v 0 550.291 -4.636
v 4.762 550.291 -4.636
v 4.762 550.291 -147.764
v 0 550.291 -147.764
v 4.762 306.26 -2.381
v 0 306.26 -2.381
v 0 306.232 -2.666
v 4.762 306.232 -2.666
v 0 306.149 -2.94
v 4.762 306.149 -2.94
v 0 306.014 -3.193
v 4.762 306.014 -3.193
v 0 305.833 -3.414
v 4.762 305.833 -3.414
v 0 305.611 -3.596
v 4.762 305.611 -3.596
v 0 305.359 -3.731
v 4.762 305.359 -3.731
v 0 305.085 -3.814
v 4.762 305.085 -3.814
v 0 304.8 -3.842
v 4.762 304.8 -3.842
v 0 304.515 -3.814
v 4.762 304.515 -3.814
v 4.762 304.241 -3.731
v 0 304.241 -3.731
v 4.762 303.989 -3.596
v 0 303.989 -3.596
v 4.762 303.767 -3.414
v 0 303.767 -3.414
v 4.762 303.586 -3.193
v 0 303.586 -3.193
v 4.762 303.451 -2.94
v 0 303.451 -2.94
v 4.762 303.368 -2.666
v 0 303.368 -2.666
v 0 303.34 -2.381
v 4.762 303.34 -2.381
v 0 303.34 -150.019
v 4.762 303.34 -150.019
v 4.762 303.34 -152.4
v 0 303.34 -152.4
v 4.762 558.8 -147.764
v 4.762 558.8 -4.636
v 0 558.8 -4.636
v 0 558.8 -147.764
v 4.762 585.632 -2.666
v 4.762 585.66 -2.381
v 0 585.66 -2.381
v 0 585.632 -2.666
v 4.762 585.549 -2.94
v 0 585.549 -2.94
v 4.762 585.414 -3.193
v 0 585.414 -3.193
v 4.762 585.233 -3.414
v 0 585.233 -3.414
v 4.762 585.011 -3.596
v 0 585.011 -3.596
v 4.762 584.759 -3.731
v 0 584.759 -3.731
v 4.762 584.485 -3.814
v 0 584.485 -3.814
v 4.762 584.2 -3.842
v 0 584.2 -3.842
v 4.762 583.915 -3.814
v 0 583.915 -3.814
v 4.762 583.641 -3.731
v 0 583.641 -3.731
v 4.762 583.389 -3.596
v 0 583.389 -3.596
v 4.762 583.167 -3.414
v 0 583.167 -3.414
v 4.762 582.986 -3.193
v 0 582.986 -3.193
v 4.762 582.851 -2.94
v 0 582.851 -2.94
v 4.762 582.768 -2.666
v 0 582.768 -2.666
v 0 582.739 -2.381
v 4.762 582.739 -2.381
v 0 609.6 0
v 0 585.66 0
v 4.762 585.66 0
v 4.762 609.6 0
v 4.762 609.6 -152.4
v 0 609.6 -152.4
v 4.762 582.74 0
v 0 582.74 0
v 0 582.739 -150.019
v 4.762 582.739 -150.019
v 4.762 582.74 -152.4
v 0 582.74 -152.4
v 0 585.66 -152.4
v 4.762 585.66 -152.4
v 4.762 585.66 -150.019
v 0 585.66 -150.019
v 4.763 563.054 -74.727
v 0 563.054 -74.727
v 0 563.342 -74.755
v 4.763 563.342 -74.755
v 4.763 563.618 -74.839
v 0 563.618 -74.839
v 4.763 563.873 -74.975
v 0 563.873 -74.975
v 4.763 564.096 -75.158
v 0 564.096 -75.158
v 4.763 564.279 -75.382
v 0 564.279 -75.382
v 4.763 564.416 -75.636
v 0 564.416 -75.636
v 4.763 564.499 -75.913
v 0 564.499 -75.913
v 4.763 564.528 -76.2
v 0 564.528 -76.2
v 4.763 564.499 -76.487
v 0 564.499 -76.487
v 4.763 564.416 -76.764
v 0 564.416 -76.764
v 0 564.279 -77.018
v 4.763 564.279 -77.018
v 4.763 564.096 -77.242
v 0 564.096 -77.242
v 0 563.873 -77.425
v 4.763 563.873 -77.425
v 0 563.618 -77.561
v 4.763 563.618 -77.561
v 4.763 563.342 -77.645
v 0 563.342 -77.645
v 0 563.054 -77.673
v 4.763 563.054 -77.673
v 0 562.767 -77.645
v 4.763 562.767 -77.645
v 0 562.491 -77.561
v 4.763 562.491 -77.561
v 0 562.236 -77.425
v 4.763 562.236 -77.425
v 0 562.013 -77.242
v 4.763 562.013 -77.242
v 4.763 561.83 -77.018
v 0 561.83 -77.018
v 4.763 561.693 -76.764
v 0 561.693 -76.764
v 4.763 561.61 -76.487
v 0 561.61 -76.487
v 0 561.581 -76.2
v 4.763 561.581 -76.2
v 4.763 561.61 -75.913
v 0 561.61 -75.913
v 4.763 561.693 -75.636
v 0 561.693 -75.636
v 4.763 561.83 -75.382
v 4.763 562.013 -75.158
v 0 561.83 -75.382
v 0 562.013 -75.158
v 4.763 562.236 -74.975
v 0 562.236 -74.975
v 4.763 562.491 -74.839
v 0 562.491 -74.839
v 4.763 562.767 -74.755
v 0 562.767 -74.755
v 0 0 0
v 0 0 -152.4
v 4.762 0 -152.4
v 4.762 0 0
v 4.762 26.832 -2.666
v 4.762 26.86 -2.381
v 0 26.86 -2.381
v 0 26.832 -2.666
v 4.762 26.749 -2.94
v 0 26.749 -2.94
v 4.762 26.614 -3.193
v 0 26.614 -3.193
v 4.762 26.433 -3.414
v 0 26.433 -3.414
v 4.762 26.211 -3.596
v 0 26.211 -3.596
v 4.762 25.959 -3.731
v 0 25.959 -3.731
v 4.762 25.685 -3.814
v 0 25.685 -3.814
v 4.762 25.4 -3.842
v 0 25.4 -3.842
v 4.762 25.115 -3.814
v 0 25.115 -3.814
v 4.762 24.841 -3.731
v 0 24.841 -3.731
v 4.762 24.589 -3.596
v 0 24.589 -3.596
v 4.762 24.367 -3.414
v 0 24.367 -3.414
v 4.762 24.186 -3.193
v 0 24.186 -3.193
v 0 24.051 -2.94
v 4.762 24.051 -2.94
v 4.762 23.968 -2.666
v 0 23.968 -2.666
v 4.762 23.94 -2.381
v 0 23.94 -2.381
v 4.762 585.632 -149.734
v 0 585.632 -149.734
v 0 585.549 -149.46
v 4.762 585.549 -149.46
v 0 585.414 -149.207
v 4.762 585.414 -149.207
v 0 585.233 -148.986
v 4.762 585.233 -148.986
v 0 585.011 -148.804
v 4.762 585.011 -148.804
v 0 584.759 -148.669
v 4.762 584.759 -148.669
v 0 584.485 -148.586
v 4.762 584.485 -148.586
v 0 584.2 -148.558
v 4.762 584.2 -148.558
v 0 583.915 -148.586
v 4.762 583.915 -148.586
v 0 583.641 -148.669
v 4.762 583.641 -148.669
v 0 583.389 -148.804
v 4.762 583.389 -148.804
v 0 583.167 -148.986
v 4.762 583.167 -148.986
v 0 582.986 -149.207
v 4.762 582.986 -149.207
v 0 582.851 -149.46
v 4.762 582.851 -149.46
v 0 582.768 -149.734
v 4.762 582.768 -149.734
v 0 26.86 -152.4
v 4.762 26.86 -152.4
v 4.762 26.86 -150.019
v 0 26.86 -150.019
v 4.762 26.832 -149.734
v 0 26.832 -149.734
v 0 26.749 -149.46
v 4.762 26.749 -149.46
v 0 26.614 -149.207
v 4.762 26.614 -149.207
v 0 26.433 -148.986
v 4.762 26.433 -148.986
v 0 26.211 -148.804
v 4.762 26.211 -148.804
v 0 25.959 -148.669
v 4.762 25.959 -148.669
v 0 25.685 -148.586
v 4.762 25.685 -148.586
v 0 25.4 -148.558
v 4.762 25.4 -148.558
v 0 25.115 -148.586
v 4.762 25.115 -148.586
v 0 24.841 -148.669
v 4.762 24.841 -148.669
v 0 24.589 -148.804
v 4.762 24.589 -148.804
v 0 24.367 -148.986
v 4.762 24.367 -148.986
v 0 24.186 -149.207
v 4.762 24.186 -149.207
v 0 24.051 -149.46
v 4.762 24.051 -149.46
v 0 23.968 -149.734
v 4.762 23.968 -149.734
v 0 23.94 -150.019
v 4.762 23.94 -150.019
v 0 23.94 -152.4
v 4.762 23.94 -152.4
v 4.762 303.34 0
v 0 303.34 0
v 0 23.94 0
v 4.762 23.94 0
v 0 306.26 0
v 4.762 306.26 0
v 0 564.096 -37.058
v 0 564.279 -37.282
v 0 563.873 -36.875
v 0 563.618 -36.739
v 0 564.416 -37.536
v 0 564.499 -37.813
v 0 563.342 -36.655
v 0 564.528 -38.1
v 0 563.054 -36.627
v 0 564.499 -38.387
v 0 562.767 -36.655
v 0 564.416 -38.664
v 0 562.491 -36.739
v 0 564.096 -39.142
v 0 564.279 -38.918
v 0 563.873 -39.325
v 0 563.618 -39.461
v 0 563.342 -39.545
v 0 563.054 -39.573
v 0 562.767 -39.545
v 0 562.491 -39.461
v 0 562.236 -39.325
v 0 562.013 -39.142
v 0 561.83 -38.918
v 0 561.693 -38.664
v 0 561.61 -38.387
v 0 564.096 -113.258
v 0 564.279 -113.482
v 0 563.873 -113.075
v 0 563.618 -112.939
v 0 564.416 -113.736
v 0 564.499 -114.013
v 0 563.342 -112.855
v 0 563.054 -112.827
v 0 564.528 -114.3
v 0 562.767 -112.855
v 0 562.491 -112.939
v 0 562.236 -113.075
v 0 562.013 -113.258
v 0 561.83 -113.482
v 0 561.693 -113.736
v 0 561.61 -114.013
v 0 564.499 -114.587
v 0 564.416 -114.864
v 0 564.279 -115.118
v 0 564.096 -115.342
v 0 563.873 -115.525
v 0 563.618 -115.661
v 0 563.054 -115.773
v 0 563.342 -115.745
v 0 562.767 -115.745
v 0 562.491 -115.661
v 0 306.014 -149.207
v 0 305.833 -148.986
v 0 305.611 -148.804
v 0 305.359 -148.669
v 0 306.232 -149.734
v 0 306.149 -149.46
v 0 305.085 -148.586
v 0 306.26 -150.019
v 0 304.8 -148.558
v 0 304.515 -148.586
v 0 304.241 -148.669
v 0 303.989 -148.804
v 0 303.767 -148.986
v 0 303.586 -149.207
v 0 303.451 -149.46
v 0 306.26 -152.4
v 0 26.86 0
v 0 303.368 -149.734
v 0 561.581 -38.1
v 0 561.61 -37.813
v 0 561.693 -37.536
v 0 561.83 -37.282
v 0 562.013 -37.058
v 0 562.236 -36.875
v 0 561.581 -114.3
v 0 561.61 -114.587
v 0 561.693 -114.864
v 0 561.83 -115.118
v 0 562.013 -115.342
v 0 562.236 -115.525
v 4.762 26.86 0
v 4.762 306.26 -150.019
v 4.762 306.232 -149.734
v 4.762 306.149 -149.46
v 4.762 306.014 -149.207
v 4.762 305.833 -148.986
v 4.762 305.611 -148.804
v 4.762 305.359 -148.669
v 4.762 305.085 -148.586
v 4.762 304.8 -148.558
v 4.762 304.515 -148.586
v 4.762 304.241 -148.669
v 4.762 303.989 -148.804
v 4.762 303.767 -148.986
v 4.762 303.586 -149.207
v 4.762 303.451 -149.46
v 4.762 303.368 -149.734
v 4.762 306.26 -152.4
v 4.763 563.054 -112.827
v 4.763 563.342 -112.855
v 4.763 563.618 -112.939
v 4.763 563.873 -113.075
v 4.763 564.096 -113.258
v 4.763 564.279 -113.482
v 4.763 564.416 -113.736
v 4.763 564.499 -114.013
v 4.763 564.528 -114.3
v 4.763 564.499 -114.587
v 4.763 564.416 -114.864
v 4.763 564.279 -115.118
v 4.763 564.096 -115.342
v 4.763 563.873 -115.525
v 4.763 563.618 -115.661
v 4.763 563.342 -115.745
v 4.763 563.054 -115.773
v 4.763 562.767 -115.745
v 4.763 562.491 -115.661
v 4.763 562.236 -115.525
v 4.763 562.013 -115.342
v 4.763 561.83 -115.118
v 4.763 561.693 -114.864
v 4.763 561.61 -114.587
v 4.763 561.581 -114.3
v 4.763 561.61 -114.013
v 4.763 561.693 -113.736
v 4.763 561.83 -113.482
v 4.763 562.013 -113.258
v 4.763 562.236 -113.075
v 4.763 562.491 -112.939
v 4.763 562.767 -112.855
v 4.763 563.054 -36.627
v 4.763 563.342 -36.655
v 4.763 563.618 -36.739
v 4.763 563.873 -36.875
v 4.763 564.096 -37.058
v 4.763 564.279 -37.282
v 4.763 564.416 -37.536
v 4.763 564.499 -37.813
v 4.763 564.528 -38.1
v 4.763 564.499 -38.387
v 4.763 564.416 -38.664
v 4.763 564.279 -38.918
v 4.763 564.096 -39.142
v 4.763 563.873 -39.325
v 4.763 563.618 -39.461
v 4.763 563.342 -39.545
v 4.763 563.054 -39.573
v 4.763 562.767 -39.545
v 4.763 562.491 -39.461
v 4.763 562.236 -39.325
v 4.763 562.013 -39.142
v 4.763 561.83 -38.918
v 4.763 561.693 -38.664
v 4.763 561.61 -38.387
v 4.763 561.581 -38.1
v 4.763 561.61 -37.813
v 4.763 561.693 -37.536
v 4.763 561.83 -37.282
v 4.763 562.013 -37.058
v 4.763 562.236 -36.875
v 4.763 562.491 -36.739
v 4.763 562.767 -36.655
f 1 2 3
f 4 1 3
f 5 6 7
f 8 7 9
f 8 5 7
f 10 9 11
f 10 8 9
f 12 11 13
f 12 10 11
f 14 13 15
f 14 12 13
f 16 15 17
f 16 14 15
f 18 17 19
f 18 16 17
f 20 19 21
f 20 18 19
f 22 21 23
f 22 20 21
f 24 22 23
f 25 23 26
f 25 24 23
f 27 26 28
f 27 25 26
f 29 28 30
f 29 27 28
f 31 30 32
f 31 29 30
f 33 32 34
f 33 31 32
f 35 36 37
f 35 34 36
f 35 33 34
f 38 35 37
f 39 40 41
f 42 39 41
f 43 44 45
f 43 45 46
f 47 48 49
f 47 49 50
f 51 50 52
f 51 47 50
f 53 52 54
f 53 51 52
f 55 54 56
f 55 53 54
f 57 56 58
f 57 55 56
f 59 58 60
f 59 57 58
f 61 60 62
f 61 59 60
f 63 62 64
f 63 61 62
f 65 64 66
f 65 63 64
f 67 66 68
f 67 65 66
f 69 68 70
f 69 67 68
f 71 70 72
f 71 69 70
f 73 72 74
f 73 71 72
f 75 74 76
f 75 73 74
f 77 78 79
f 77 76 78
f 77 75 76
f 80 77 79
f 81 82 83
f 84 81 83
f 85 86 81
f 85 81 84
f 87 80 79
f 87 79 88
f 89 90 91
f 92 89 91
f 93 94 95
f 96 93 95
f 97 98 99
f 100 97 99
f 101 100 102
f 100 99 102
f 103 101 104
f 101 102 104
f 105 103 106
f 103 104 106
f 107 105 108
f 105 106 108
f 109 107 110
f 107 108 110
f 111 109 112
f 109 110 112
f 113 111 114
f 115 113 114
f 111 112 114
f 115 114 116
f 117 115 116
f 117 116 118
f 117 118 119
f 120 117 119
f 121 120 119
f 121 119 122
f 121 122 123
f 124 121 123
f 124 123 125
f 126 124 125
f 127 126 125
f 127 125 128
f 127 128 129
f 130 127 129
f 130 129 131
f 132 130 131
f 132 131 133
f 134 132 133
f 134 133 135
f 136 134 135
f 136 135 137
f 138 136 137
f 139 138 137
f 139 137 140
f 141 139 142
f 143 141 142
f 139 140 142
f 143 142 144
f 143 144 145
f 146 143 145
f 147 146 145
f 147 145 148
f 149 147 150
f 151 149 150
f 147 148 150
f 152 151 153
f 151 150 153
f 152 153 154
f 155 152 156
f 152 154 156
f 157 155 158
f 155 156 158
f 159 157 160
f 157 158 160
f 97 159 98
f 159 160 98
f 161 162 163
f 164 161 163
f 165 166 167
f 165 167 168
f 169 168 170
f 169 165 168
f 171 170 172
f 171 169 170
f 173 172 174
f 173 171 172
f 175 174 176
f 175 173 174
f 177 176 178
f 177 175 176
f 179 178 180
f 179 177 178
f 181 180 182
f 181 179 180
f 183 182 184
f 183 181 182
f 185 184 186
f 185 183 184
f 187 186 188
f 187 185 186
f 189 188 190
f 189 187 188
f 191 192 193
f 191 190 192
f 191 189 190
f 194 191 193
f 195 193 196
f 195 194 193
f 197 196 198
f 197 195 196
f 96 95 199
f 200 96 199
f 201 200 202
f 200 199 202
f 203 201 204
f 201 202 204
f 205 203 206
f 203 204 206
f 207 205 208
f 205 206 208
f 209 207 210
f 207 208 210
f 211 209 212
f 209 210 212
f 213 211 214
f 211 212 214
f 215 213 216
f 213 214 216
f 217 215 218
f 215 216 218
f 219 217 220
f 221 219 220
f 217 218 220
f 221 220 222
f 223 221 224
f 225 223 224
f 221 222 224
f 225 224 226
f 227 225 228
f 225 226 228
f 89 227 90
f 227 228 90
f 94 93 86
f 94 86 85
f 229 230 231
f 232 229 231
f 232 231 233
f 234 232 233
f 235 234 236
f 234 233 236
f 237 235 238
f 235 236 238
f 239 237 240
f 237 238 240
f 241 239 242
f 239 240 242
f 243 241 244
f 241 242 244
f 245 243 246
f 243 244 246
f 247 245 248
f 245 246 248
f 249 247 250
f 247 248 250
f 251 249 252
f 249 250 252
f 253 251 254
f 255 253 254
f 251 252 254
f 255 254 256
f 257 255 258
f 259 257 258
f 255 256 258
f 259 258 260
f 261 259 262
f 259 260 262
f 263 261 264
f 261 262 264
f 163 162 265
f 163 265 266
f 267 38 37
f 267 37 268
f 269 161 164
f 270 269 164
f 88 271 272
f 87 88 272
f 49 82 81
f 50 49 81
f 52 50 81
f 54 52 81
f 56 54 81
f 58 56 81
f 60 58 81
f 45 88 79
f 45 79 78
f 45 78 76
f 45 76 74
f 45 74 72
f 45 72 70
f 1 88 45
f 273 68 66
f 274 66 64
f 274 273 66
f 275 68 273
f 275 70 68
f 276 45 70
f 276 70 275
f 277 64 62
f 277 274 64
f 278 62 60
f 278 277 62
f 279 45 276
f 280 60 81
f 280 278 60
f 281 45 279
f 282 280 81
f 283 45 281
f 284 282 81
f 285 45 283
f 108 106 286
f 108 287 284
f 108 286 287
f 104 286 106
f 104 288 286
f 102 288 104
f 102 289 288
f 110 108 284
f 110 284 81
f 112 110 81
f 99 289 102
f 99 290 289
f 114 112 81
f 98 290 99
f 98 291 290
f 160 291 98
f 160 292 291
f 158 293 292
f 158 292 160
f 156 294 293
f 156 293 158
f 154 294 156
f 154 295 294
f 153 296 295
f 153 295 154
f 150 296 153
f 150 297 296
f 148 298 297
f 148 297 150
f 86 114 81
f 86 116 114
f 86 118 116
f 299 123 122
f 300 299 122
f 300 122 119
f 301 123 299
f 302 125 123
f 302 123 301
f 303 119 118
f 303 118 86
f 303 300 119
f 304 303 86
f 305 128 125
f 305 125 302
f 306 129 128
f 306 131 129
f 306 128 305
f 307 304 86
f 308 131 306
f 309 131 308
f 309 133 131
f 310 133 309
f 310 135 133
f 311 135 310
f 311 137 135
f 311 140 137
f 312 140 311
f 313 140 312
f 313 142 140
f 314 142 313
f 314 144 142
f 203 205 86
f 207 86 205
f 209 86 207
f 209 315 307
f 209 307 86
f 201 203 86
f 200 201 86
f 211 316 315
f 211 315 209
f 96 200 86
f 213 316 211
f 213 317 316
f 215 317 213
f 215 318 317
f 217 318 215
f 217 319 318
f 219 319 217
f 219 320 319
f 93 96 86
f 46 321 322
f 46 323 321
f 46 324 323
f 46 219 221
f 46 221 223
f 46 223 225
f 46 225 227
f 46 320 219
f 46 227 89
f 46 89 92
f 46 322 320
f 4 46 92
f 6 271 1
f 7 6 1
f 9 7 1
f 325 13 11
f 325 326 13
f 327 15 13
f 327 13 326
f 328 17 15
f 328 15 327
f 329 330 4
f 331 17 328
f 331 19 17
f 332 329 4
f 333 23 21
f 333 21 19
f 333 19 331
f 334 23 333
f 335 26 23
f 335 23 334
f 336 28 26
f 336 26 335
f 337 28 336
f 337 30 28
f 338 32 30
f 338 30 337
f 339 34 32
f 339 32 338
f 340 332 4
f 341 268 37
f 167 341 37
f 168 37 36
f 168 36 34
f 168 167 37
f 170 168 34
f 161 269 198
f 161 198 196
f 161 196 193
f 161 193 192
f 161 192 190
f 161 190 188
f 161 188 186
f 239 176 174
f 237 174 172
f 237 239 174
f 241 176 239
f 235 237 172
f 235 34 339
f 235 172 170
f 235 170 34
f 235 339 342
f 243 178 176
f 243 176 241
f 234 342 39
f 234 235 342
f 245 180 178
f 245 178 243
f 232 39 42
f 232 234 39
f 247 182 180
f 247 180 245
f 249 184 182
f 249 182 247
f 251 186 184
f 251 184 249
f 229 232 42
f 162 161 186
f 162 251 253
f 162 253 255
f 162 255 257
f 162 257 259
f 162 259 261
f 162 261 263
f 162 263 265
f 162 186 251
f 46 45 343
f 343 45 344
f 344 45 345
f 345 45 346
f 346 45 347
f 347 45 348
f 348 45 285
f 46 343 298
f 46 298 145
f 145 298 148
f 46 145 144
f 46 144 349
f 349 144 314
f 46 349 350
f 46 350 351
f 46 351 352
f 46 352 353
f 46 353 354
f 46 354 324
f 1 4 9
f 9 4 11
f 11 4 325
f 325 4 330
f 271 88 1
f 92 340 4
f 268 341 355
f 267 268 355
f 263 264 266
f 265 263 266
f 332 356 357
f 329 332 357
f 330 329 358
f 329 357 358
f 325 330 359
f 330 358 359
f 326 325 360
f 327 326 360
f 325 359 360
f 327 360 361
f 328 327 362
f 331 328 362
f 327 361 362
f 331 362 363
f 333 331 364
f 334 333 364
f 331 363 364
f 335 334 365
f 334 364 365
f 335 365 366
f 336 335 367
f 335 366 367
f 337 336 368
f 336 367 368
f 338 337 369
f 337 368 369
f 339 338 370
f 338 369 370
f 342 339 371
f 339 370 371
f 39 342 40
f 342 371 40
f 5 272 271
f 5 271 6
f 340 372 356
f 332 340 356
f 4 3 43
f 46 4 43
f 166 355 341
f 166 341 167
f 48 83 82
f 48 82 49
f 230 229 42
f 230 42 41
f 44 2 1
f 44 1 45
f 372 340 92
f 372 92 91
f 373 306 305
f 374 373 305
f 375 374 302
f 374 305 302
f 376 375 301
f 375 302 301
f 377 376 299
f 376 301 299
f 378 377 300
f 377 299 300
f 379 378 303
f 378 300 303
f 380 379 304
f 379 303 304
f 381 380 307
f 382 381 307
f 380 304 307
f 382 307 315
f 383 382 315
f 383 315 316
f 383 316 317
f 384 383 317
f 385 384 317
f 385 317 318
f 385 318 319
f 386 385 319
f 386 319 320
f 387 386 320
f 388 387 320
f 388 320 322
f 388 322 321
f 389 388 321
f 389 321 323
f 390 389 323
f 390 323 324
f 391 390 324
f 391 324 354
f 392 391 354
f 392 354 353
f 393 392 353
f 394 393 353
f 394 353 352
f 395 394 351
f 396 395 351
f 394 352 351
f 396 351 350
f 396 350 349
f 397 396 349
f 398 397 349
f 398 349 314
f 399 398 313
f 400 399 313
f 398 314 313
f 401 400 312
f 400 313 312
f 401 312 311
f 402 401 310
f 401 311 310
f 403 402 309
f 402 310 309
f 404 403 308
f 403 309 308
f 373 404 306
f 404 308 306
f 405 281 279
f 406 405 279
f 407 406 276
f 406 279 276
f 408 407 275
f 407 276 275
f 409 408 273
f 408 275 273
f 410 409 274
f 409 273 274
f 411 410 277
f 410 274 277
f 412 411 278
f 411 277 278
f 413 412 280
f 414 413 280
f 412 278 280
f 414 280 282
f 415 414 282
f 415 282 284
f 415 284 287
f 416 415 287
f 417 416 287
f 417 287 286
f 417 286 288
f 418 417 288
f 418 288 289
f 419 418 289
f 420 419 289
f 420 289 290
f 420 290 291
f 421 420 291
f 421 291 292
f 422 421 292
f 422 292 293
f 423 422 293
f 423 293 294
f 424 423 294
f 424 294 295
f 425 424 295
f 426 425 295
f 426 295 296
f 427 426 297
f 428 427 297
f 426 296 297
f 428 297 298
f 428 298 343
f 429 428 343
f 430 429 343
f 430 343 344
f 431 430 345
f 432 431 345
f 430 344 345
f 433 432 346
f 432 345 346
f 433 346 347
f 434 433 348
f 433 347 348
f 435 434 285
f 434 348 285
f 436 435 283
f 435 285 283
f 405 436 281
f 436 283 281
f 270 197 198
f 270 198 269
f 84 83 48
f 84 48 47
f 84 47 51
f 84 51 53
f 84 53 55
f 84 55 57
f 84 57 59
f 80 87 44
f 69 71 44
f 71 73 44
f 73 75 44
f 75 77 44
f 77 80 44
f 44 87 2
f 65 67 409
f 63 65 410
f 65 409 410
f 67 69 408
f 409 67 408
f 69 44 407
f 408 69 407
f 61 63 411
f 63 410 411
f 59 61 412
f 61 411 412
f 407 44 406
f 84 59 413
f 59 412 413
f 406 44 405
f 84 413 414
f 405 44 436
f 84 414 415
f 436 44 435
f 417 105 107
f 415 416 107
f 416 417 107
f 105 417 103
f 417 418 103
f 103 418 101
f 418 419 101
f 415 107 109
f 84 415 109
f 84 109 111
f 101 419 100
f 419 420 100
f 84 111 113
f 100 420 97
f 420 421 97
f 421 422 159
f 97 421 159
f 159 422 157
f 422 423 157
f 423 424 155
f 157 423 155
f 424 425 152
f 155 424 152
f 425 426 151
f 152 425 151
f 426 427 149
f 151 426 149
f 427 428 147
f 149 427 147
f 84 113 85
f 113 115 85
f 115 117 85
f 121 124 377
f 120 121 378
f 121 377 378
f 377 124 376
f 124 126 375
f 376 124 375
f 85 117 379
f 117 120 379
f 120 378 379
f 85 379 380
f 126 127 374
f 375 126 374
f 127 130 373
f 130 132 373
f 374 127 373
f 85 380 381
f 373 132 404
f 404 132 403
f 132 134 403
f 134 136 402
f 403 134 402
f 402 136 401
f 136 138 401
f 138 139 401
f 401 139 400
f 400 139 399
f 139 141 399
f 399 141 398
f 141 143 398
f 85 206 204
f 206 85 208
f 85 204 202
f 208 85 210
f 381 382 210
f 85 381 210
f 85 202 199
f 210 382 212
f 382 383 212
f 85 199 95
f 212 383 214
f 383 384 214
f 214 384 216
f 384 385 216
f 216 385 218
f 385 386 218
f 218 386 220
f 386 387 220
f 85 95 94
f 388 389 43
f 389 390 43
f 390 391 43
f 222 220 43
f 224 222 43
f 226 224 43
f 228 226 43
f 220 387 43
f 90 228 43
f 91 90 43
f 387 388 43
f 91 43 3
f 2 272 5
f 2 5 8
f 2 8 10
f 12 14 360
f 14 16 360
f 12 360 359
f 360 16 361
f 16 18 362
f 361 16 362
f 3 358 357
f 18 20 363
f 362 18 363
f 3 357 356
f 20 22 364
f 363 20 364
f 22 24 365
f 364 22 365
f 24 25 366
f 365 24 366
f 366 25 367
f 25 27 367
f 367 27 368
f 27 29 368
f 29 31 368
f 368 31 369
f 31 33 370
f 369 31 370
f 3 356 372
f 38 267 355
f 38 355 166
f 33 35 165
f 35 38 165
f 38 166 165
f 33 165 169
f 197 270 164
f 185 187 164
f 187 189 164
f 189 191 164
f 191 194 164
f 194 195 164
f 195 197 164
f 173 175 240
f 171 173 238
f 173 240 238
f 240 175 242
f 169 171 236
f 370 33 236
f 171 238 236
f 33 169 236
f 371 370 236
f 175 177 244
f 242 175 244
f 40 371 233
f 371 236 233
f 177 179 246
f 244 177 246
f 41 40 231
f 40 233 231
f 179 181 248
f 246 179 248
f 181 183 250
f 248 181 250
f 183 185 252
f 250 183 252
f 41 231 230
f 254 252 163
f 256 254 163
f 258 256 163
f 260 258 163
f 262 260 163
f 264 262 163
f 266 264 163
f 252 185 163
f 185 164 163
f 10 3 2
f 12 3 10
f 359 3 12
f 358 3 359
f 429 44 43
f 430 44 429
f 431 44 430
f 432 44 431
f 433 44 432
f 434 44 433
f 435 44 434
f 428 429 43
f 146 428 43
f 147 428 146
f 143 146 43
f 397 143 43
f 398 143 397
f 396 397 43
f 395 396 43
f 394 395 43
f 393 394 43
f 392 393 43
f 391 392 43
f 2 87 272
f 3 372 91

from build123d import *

# Parameters (mm, degrees)
SKETCH1_W             = 4.7625
SKETCH1_H             = 152.4
BOSS_EXTRUDE1_DEPTH   = 609.6
SKETCH2_W             = 143.129
SKETCH2_H             = 8.509
CUT_EXTRUDE1_DEPTH    = 629.379345146
F_4_CLEARANCE_HOLE1_D = 2.9464
CUT_EXTRUDE2_DEPTH    = 629.379345146


with BuildPart() as part:
    # Sketch1 → Boss-Extrude1 (new body)
    with BuildSketch(Plane(origin=(0, 0, 0), x_dir=(1, 0, 0), z_dir=(0, 1, 0))):
        with Locations((2.38125, 76.2)):
            Rectangle(SKETCH1_W, SKETCH1_H)
    extrude(amount=BOSS_EXTRUDE1_DEPTH)

    # Sketch2 → Cut-Extrude1 (cut, through all)
    with BuildSketch(Plane(origin=(4.7625, 0, 0), x_dir=(0, 0, -1), z_dir=(1, 0, 0))):
        with Locations((76.2, 554.5455)):
            Rectangle(SKETCH2_W, SKETCH2_H)
    extrude(amount=-CUT_EXTRUDE1_DEPTH, mode=Mode.SUBTRACT)

    # #4 Clearance Hole1 (through all)
    with Locations(Plane(origin=(4.7625, 0, 0), x_dir=(0, 0, -1), z_dir=(1, 0, 0))):
        with Locations((114.3, 563.0545), (76.2, 563.0545), (38.1, 563.0545)):
            Hole(F_4_CLEARANCE_HOLE1_D / 2)

    # Sketch12 → Cut-Extrude2 (cut, through all)
    with BuildSketch(Plane(origin=(4.7625, 0, 0), x_dir=(0, 0, -1), z_dir=(1, 0, 0))):
        with BuildLine():
            Line((150.01875, 23.9395), (152.4, 23.9395))
            Line((152.4, 23.9395), (152.4, 26.8605))
            Line((152.4, 26.8605), (150.01875, 26.8605))
            ThreePointArc((150.01875, 26.8605), (148.55825, 25.4), (150.01875, 23.9395))
        make_face()
        with BuildLine():
            Line((2.38125, 23.9395), (0, 23.9395))
            Line((0, 23.9395), (0, 26.8605))
            Line((0, 26.8605), (2.38125, 26.8605))
            ThreePointArc((2.38125, 26.8605), (3.84175, 25.4), (2.38125, 23.9395))
        make_face()
        with BuildLine():
            Line((0, 303.3395), (0, 306.2605))
            Line((0, 306.2605), (2.38125, 306.2605))
            ThreePointArc((2.38125, 306.2605), (3.84175, 304.8), (2.38125, 303.3395))
            Line((2.38125, 303.3395), (0, 303.3395))
        make_face()
        with BuildLine():
            Line((152.4, 303.3395), (152.4, 306.2605))
            Line((152.4, 306.2605), (150.01875, 306.2605))
            ThreePointArc((150.01875, 306.2605), (148.55825, 304.8), (150.01875, 303.3395))
            Line((150.01875, 303.3395), (152.4, 303.3395))
        make_face()
        with BuildLine():
            Line((0, 582.7395), (0, 585.6605))
            Line((0, 585.6605), (2.38125, 585.6605))
            ThreePointArc((2.38125, 585.6605), (3.84175, 584.2), (2.38125, 582.7395))
            Line((2.38125, 582.7395), (0, 582.7395))
        make_face()
        with BuildLine():
            Line((152.4, 582.7395), (152.4, 585.6605))
            Line((152.4, 585.6605), (150.01875, 585.6605))
            ThreePointArc((150.01875, 585.6605), (148.55825, 584.2), (150.01875, 582.7395))
            Line((150.01875, 582.7395), (152.4, 582.7395))
        make_face()
    extrude(amount=-CUT_EXTRUDE2_DEPTH, mode=Mode.SUBTRACT)


solid = part.part
